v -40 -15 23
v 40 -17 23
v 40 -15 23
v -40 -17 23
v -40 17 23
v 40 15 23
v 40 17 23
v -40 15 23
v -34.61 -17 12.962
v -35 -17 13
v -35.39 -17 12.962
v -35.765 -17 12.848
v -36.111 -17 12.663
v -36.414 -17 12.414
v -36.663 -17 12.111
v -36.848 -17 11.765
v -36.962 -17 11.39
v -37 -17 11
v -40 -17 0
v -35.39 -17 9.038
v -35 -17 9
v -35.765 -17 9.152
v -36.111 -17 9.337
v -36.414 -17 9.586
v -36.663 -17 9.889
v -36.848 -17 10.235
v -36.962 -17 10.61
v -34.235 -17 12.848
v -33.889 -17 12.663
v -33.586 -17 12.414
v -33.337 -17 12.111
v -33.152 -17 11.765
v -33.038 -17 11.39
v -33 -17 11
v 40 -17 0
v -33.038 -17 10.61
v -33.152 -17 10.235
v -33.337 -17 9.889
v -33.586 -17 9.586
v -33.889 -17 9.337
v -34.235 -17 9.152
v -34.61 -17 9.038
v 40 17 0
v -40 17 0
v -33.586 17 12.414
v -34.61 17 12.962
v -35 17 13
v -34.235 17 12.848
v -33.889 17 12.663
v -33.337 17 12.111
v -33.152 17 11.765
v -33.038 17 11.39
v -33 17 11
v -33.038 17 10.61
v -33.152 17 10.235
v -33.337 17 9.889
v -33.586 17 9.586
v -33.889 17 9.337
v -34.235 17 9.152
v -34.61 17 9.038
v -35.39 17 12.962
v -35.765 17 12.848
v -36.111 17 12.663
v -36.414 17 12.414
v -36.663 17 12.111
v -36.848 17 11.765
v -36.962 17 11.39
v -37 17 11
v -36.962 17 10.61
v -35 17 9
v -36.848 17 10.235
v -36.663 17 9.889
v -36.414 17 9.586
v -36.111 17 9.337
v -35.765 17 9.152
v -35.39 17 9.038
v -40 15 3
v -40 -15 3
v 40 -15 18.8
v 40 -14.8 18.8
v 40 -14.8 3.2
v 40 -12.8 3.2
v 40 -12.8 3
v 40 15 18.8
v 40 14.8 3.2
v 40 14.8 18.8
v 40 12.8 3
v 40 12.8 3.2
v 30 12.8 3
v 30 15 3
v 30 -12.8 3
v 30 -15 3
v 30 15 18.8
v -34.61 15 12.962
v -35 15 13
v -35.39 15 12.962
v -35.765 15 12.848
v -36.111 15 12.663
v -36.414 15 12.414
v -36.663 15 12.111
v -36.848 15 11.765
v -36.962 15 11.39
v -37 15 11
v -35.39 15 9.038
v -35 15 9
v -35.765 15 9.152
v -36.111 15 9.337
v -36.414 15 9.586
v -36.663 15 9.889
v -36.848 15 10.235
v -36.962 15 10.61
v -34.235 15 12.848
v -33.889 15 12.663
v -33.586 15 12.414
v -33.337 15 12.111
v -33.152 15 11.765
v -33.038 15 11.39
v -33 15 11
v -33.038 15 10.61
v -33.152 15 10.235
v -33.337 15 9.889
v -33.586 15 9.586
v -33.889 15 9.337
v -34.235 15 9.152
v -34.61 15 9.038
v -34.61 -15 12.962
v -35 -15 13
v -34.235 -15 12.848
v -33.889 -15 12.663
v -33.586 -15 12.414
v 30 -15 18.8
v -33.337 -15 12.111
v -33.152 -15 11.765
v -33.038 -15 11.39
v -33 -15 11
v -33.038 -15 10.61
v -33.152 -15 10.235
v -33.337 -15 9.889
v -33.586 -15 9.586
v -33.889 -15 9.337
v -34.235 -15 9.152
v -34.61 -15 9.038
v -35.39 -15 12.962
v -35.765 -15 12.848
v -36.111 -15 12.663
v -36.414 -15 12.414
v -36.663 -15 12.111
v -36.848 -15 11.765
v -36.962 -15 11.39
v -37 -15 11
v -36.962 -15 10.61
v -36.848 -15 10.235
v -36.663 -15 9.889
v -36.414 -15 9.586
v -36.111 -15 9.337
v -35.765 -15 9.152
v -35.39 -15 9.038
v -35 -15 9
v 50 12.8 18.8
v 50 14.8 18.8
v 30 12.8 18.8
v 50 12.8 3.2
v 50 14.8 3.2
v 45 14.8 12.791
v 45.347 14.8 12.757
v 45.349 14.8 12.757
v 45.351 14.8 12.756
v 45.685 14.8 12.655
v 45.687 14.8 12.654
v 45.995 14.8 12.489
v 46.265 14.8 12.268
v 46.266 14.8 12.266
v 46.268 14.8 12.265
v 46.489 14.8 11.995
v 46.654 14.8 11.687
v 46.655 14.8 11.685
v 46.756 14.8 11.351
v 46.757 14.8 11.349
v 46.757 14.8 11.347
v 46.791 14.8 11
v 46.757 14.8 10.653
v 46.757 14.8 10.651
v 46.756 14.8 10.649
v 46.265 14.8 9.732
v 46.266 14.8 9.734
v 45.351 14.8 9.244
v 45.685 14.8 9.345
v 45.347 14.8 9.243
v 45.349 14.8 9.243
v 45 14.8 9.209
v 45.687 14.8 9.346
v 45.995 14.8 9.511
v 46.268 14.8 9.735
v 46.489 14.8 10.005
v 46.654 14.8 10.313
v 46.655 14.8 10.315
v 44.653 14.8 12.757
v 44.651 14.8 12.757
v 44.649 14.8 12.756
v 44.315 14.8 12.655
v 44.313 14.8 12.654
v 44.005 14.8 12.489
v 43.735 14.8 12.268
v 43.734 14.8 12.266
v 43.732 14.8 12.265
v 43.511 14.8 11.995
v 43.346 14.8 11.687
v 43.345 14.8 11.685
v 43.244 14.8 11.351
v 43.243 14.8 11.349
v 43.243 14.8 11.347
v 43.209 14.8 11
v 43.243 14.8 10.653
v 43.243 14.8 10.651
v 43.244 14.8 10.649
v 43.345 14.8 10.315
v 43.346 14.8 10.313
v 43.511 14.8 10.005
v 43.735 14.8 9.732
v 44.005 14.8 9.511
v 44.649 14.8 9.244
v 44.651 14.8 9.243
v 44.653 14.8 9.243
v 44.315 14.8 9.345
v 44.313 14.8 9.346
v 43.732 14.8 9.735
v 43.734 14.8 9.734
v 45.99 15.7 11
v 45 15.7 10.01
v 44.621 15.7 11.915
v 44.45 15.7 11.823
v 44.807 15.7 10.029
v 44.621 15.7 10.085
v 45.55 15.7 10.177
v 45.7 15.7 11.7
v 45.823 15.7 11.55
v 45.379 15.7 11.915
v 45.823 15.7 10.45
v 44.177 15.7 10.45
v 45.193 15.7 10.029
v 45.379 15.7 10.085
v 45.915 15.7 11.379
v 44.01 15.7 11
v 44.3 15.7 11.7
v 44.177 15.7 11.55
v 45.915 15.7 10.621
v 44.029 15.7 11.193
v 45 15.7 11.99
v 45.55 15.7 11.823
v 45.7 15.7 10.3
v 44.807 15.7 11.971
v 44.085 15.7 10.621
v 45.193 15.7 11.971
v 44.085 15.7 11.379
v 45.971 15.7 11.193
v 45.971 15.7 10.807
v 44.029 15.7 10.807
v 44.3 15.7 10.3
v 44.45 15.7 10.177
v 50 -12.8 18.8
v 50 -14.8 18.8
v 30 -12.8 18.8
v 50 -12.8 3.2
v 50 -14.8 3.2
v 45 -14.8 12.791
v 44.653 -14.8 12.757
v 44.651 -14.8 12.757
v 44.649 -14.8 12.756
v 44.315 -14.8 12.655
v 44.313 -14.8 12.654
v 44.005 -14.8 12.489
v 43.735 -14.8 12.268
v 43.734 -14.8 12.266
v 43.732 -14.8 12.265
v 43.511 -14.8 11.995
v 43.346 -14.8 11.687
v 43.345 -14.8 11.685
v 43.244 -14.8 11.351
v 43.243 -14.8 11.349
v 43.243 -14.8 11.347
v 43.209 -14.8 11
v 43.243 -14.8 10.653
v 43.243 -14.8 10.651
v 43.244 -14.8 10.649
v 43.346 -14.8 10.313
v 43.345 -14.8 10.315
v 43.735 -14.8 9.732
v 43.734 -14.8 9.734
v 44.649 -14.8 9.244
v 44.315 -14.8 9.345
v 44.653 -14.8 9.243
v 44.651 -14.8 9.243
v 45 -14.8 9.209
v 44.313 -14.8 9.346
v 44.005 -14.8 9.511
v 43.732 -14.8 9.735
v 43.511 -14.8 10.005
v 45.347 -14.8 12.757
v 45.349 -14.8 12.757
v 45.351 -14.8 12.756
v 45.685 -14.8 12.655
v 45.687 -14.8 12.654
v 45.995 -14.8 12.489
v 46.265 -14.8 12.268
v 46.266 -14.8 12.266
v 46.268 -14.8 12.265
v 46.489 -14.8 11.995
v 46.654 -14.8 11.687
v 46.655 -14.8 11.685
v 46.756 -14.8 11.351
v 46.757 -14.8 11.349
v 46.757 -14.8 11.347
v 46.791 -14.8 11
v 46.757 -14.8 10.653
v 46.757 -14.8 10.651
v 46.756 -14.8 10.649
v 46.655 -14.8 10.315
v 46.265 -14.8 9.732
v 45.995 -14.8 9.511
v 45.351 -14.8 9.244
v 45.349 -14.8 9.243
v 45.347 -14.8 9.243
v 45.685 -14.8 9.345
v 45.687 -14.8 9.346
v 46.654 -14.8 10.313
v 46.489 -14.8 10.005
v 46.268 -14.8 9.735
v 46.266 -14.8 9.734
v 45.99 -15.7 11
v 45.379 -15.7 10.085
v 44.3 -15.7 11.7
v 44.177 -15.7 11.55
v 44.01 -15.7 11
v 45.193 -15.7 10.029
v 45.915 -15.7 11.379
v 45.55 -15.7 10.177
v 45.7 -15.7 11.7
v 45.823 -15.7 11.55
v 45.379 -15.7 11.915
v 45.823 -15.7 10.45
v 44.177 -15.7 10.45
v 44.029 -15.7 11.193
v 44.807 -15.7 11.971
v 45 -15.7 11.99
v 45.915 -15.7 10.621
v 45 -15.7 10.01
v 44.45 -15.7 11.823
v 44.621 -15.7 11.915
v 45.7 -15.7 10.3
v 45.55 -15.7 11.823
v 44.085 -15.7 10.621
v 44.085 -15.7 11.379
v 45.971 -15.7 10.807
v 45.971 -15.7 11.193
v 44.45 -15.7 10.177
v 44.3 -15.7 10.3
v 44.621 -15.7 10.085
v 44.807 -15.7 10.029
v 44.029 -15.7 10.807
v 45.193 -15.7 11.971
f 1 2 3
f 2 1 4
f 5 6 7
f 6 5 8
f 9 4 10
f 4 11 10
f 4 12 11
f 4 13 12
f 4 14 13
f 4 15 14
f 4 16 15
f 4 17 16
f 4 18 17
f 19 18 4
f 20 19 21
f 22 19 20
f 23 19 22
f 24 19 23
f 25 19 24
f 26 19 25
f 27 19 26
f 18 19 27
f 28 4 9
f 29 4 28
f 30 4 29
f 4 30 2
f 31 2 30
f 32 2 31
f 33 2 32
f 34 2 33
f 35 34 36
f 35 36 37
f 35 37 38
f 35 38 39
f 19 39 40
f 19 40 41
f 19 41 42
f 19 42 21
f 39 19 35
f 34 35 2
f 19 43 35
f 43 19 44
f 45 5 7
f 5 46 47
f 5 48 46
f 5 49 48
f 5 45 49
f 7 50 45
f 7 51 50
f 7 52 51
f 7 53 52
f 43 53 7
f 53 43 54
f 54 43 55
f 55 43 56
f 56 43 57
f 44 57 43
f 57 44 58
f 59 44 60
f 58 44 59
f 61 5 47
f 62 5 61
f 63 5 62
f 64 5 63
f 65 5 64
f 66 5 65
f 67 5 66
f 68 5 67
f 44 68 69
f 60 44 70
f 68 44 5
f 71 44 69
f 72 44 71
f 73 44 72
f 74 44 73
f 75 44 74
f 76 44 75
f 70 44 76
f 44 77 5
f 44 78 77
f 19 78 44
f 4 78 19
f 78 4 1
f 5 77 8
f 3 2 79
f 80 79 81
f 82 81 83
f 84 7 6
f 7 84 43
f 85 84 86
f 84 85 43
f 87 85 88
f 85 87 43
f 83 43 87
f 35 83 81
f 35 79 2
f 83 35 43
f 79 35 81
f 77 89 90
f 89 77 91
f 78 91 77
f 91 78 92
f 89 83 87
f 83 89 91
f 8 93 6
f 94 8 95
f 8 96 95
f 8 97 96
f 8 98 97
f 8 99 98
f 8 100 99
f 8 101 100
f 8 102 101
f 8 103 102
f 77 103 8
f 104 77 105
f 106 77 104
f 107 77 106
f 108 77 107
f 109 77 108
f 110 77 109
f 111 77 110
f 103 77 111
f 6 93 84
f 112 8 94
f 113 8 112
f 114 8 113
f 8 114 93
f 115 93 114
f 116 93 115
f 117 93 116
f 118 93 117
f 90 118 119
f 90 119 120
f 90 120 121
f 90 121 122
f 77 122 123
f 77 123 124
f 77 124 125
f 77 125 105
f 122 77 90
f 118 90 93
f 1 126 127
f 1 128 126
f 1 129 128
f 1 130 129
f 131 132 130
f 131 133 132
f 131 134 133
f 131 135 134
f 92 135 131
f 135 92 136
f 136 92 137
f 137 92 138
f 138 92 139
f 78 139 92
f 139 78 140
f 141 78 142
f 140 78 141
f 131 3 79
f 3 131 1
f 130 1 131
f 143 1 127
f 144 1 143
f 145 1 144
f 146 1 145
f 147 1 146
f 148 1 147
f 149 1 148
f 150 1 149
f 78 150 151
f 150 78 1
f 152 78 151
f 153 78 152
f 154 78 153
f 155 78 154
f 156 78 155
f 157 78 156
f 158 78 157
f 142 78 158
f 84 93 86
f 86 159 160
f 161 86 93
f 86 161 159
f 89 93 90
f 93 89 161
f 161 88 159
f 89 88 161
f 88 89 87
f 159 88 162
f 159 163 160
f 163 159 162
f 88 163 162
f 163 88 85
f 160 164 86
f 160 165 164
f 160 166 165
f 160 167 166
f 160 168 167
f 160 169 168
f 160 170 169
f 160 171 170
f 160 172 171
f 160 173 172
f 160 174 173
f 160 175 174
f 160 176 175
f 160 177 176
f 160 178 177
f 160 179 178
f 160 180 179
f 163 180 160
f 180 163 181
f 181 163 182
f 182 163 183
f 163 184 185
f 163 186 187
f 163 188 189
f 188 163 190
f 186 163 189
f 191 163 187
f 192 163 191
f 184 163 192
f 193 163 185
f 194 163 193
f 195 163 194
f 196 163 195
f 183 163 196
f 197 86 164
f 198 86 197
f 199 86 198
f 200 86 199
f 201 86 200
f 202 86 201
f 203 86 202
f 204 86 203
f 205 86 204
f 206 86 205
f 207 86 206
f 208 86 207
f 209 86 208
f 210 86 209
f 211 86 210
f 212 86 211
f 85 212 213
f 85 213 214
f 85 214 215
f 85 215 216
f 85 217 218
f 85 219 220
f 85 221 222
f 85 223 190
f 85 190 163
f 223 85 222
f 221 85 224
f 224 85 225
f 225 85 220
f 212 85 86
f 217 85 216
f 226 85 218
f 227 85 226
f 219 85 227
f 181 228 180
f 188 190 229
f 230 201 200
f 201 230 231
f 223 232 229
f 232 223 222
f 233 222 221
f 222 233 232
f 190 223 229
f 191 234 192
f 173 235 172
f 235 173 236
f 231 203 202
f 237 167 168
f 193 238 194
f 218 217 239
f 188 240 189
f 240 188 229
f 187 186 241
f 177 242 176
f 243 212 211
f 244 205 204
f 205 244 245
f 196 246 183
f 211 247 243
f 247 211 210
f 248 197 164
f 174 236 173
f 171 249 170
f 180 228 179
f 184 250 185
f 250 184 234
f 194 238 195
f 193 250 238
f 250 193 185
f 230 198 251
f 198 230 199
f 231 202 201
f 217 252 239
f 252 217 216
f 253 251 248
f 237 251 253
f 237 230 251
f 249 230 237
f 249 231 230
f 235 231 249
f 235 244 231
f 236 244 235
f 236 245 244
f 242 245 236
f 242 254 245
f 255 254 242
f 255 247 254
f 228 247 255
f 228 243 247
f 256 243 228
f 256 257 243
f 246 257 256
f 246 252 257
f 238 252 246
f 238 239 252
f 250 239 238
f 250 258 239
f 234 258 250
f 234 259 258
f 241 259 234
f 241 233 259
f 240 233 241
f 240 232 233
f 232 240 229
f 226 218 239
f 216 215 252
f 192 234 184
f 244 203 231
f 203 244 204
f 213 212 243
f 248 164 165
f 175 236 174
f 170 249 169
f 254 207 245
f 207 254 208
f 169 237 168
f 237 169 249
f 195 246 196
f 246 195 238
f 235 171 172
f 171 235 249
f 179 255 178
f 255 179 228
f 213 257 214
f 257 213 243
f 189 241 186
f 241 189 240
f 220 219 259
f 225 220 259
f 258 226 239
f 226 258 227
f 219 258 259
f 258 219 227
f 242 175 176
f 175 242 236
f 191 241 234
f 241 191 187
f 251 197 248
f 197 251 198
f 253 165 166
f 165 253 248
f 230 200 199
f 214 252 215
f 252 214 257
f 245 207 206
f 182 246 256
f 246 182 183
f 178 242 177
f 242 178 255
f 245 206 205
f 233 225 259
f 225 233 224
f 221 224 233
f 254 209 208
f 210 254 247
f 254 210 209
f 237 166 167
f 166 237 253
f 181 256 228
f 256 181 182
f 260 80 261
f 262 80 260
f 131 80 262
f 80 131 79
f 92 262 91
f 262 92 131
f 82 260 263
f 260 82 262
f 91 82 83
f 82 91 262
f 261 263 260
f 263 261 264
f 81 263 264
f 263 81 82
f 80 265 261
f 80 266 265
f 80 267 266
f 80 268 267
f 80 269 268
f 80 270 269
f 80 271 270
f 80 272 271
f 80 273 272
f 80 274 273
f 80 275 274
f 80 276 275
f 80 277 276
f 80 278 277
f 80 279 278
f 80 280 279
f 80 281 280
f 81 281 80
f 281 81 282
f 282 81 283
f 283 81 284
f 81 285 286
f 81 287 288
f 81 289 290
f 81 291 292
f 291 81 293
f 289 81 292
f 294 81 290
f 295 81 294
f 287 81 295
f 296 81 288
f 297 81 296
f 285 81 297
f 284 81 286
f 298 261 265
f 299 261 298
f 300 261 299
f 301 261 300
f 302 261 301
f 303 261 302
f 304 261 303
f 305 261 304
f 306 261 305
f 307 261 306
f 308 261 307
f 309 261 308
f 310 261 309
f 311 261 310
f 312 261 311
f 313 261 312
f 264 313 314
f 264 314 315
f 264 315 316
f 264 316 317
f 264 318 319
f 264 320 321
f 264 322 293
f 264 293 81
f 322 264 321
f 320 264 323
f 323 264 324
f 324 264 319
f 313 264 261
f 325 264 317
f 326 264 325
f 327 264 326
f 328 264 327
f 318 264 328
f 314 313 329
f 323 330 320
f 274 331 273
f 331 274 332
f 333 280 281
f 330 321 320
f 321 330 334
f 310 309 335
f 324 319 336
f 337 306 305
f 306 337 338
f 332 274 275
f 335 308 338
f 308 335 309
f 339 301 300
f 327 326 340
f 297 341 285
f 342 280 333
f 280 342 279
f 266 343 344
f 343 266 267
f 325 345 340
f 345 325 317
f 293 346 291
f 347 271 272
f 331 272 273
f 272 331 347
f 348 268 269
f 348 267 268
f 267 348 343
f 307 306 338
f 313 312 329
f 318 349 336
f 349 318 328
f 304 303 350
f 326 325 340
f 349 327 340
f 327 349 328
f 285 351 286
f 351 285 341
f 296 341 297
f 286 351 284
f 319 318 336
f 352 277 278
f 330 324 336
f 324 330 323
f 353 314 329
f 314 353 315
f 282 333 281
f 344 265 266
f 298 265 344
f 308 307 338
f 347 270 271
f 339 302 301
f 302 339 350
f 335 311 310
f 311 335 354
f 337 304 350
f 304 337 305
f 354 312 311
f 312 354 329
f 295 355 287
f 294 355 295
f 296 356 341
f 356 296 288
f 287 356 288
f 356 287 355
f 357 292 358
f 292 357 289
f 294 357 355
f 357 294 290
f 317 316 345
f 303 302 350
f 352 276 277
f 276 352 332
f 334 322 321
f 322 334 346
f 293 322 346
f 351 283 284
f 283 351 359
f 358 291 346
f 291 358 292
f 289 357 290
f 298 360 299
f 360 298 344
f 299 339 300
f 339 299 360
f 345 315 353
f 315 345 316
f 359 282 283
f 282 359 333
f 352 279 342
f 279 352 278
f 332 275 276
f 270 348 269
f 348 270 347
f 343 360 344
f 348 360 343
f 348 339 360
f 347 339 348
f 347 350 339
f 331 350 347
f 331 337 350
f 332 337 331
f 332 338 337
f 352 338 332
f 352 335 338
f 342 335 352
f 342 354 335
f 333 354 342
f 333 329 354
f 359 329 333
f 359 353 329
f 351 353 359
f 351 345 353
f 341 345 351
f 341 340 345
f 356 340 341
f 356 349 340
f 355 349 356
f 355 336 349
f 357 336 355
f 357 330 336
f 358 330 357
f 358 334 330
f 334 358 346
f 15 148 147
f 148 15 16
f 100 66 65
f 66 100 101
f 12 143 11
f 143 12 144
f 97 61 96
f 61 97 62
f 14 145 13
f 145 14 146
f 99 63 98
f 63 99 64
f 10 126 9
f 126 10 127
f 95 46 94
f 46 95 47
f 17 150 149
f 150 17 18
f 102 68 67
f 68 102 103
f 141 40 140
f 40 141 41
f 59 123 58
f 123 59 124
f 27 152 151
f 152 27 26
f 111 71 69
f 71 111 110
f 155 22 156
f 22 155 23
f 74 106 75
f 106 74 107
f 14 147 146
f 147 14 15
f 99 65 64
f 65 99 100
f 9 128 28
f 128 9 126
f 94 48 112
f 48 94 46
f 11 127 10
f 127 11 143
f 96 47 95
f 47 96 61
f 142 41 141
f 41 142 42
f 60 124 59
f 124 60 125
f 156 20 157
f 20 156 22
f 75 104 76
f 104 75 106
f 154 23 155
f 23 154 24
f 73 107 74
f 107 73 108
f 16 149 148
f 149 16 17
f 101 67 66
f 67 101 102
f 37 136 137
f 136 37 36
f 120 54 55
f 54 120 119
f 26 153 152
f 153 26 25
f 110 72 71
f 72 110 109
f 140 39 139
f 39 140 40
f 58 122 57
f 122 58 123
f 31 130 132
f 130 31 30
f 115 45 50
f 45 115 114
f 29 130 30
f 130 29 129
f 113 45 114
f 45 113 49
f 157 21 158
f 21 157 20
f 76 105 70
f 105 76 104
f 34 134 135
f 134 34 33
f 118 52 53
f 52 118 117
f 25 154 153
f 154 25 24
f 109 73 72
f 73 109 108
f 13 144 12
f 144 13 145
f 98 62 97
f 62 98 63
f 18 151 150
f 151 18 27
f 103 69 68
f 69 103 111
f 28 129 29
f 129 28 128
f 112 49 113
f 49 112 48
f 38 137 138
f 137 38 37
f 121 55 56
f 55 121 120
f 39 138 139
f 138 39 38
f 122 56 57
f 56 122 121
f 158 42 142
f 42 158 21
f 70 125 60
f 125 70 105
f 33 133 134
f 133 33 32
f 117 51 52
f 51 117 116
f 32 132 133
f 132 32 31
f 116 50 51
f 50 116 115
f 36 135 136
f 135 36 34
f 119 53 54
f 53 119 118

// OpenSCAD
// Modulární kabelový žlab: rovný díl, zatáčka L, křižovatka +, kryty.
//
// Spoj na zacvaknutí: konec s čepy (M) má na bocích pružné jazýčky
// s kuželovým čepem, které se zasunou dovnitř sousedního dílu; konec
// s otvory (F) má v bočních stěnách kulaté díry, do kterých čep zapadne.
// Kryt drží límcem v kanálu a zacvakne se čepy na límci do otvorů
// pod horní hranou stěn.
//
// Žebrování = průhledové výřezy skrz stěny, dno nebo kryt; mezi výřezy
// zůstávají žebra. Výřezy můžou být šikmé (úhel od svislice / od příčného směru).
//
// Zkosení: horní vnější hrany stěn (ch) a svislé vnější hrany na koncích
// dílů u spojů (cj); obojí platí i pro kryt.
//
// Souřadnice: dno leží v rovině z = 0. Díl se skládá z ramen vycházejících
// ze středu; port = střed čela ramene v rovině dna, úhel = směr ven.
// Pořadí a polohy portů musí odpovídat funkci `ports` v app.js.

/* [Co renderovat] */
what = "body";     // [body, lid]
part = "straight"; // [straight, corner, cross]
len  = 80;         // délka rovného dílu
arm  = 40;         // délka ramene zatáčky/křižovatky od středu k portu
genders = "FM";    // pohlaví portů v pořadí ramen: F = otvory, M = čepy

/* [Profil] */
w = 30;        // vnitřní šířka
h = 20;        // vnitřní výška
t = 2;         // tloušťka stěny
f = 3;         // tloušťka dna
c = 0.2;       // vůle spojů
bump = 0.9;    // výška čepu spoje dílů
lid_bump = 0.6; // výška čepu krytu

/* [Zkosení] */
ch = 0; // horní vnější hrany stěn, 0 = bez zkosení
cj = 0; // svislé hrany na koncích u spojů, 0 = bez zkosení

/* [Výřezy v bocích] */
slots    = false;
slot_w   = 6;  // šířka výřezu
slot_bar = 4;  // šířka žebra mezi výřezy
slot_m   = 2;  // okraj nad dnem a pod límcem krytu
slot_a   = 45; // úhel výřezu, 0 = svislý

/* [Výřezy ve dně] */
floor_slots    = false;
floor_slot_w   = 4;
floor_slot_bar = 6;
floor_slot_m   = 4; // okraj od stěn
floor_slot_a   = 45;

/* [Kryt] */
lid       = false; // díl má otvory pro zacvaknutí krytu
lid_t     = 2;
lid_slots    = false;
lid_slot_w   = 6;
lid_slot_bar = 6;
lid_slot_m   = 2; // okraj od límce
lid_slot_a   = 45;

/* [Pevné rozměry spojů] */
tab_len   = 10;   // jak daleko jazýček přesahuje přes konec dílu
bump_r    = 1.8;  // poloměr paty čepu spoje dílů
lip_d     = 4;    // hloubka límce krytu
lip_w     = 1.6;  // tloušťka límce krytu
lid_bump_r = 1.2; // poloměr paty čepu krytu
lid_bump_z = 2.4; // hloubka čepu krytu pod horní hranou stěny

$fn = 32;

if (what == "body")
  cable_part(part, len, arm, w, h, t, f, c, bump, genders, ch, cj,
             slots, slot_w, slot_bar, slot_m, slot_a,
             floor_slots, floor_slot_w, floor_slot_bar, floor_slot_m, floor_slot_a, lid);
else if (what == "lid")
  // Tisková orientace: deska krytu na podložce, límec nahoru.
  rotate([180, 0, 0]) translate([0, 0, -lid_t])
    cable_lid(part, len, arm, w, t, c, lid_bump, lid_t, ch, cj,
              lid_slots, lid_slot_w, lid_slot_bar, lid_slot_m, lid_slot_a);

// Ramena dílu: [úhel, délka od středu k portu].
function arms(part, len, arm) =
  part == "straight" ? [[180, len / 2], [0, len / 2]] :
  part == "corner"   ? [[180, arm], [90, arm]] :
                       [[0, arm], [90, arm], [180, arm], [270, arm]];

// Úseky ramen bez spojů na koncích: [úhel, x0, x1]. Na koncích jsou jazýčky
// nebo otvory pro čepy, takže se tam nic nevyřezává.
function free_segments(part, len, arm, W) =
  let (keep = tab_len + 1)
  part == "straight" ? [[0, -len / 2 + keep, len / 2 - keep]]
                     : [for (a = arms(part, len, arm)) [a[0], W / 2, a[1] - keep]];

// Polohy čepů krytu: [úhel, x] – na každém volném úseku kraje, nebo střed.
function lid_snaps(part, len, arm, W) =
  [for (sg = free_segments(part, len, arm, W))
     each (sg[2] - sg[1] > 30 ? [[sg[0], sg[1] + 4], [sg[0], sg[2] - 4]]
                              : [[sg[0], (sg[1] + sg[2]) / 2]])];

// Výška jazýčku: nad dnem souseda a pod límcem krytu.
function tab_z0(f, c) = f + c;
function tab_z1(f, h, c) = f + h - lip_d - c;

// Pás podél X od x0 do x1, šířka W vycentrovaná na ose, výška H.
module bar(x0, x1, W, H) translate([x0, -W / 2, 0]) cube([x1 - x0, W, H]);
module bar2d(x0, x1, W) translate([x0, -W / 2]) square([x1 - x0, W]);

// Zkosení nesmí prořezat stěnu ani kryt.
function chamfer(v, thickness) = max(0, min(v, thickness - 0.6));

// Zkosení x podle z (kolem výšky zc), resp. x podle y.
module shear_xz(k, zc) multmatrix([[1, 0, k, -k * zc], [0, 1, 0, 0], [0, 0, 1, 0], [0, 0, 0, 1]]) children();
module shear_yz(k, zc) multmatrix([[1, 0, 0, 0], [0, 1, k, -k * zc], [0, 0, 1, 0], [0, 0, 0, 1]]) children();
module shear_xy(k) multmatrix([[1, k, 0, 0], [0, 1, 0, 0], [0, 0, 1, 0], [0, 0, 0, 1]]) children();

// Rameno se zkosenými podélnými horními hranami a zkoseným vnitřním koncem.
// Konec u portu zůstává rovný, navazuje na souseda. Vnitřní konec je
// u rovného dílu i křižovatky schovaný v protějším rameni, u zatáčky tvoří vnější roh.
module arm_block(L, W, H, e) {
  if (e <= 0) bar(-W / 2, L, W, H);
  else hull() {
    bar(-W / 2, L, W, H - e);
    translate([0, 0, H - 0.01]) bar(-W / 2 + e, L, W - 2 * e, 0.01);
  }
}

// Zkosení svislých vnějších hran na konci ramene (konec je v x = L).
module joint_chamfer(L, W, H, e) {
  if (e > 0)
    for (m = [0, 1]) mirror([0, m, 0])
      translate([0, 0, -1]) linear_extrude(H + 2)
        polygon([[L + 0.01, W / 2 + 0.01], [L - e, W / 2 + 0.01], [L + 0.01, W / 2 - e]]);
}

// Středy rovnoměrně rozložených výřezů šířky sw s žebry šířky sb v intervalu [x0, x1].
function spread(x0, x1, sw, sb) =
  x1 - x0 < sw ? [] :
  let (n = floor((x1 - x0 - sw) / (sw + sb)) + 1)
    [for (k = [0 : n - 1]) (x0 + x1) / 2 + (k - (n - 1) / 2) * (sw + sb)];

// Výřezy v bočních stěnách. Šikmé výřezy mají na protilehlé stěně opačný
// sklon, takže z vnějšku vypadají obě stěny stejně a díl zůstává souměrný
// při otočení (kvůli slučování stejných dílů do jednoho STL).
module side_slots(part, len, arm, w, h, t, f, sw, sb, m, ang) {
  W = w + 2 * t;
  z0 = f + m;
  z1 = f + h - lip_d - m;
  zc = (z0 + z1) / 2;
  k = tan(ang);
  off = abs(k) * (z1 - z0);
  if (z1 > z0) {
    for (sg = free_segments(part, len, arm, W)) rotate(sg[0])
      for (side = [1, -1])
        for (x = spread(sg[1] + m + off / 2, sg[2] - m - off / 2, sw, sb))
          shear_xz(side * k, zc)
            translate([x - sw / 2, side > 0 ? w / 2 - 1 : -W / 2 - 1, z0]) cube([sw, t + 2, z1 - z0]);
    // Plochy středu, ze kterých nevede rameno (vnější roh zatáčky).
    if (part != "straight")
      for (a = [0, 90, 180, 270])
        if (len([for (r = arms(part, len, arm)) if (r[0] == a) 1]) == 0)
          rotate(a) for (y = spread(-w / 2 + m + off / 2, w / 2 - m - off / 2, sw, sb))
            shear_yz(-k, zc) translate([w / 2 - 1, y - sw / 2, z0]) cube([t + 2, sw, z1 - z0]);
  }
}

// Výřezy skrz dno.
module floor_slots_cut(part, len, arm, w, t, f, sw, sb, m, ang) {
  W = w + 2 * t;
  k = tan(ang);
  off = abs(k) * (w - 2 * m);
  for (sg = free_segments(part, len, arm, W)) rotate(sg[0])
    for (x = spread(sg[1] + m + off / 2, sg[2] - m - off / 2, sw, sb))
      shear_xy(k) translate([x - sw / 2, -(w / 2 - m), -1]) cube([sw, w - 2 * m, f + 2]);
}

// Jazýčky s čepy na konci ramene (konec ramene je v x = L).
module male_tabs(L, w, h, t, f, c, bump) {
  z0 = tab_z0(f, c);
  z1 = tab_z1(f, h, c);
  for (m = [0, 1]) mirror([0, m, 0]) {
    // Zesílení stěny uvnitř dílu, ze kterého jazýček vychází.
    translate([L - tab_len, w / 2 - c - t, f - 0.01]) cube([tab_len, t + c + 0.02, z1 - f + 0.01]);
    translate([L - 0.01, w / 2 - c - t, z0]) cube([tab_len + 0.01, t, z1 - z0]);
    translate([L + tab_len / 2, w / 2 - c - 0.01, (z0 + z1) / 2])
      rotate([-90, 0, 0]) cylinder(h = bump + 0.01, r1 = bump_r, r2 = bump_r * 0.55);
  }
}

module cable_part(part, len = 80, arm = 40, w = 30, h = 20, t = 2, f = 3, c = 0.2, bump = 0.9,
                  genders = "FM", ch = 0, cj = 0,
                  slots = false, slot_w = 6, slot_bar = 4, slot_m = 2, slot_a = 45,
                  floor_slots = false, floor_slot_w = 4, floor_slot_bar = 6, floor_slot_m = 4, floor_slot_a = 45,
                  lid = false) {
  A = arms(part, len, arm);
  W = w + 2 * t;
  H = f + h;
  e = chamfer(ch, t);
  zc = (tab_z0(f, c) + tab_z1(f, h, c)) / 2;
  difference() {
    union() {
      difference() {
        for (a = A) rotate(a[0]) arm_block(a[1], W, H, e);
        translate([0, 0, f]) for (a = A) rotate(a[0]) bar(-w / 2, a[1] + 1, w, h + 1);
      }
      for (i = [0 : len(A) - 1])
        if (genders[i] == "M") rotate(A[i][0]) male_tabs(A[i][1], w, h, t, f, c, bump);
    }
    // Otvory pro čepy souseda.
    for (i = [0 : len(A) - 1])
      if (genders[i] == "F")
        rotate(A[i][0]) translate([A[i][1] - tab_len / 2, 0, zc])
          rotate([90, 0, 0]) cylinder(r = bump_r + c, h = W + 2, center = true);
    // Otvory pro čepy krytu.
    if (lid)
      for (s = lid_snaps(part, len, arm, W))
        rotate(s[0]) translate([s[1], 0, H - lid_bump_z])
          rotate([90, 0, 0]) cylinder(r = lid_bump_r + c, h = W + 2, center = true);
    for (a = A) rotate(a[0]) joint_chamfer(a[1], W, H, chamfer(cj, t));
    if (slots) side_slots(part, len, arm, w, h, t, f, slot_w, slot_bar, slot_m, slot_a);
    if (floor_slots) floor_slots_cut(part, len, arm, w, t, f, floor_slot_w, floor_slot_bar, floor_slot_m, floor_slot_a);
  }
}

module footprint(A, W) for (a = A) rotate(a[0]) bar2d(-W / 2, a[1], W);
module channel2d(A, w, ext) for (a = A) rotate(a[0]) bar2d(-w / 2, a[1] + ext, w);

// Kryt v poloze na dílu: deska z = 0..lid_t, límec pod ní (z < 0).
module cable_lid(part, len = 80, arm = 40, w = 30, t = 2, c = 0.2, lid_bump = 0.6, lid_t = 2, ch = 0, cj = 0,
                 lid_slots = false, lid_slot_w = 6, lid_slot_bar = 6, lid_slot_m = 2, lid_slot_a = 45) {
  A = arms(part, len, arm);
  W = w + 2 * t;
  inner = w / 2 - c - lip_w; // vnitřní líc límce
  half = inner - lid_slot_m;
  k = tan(lid_slot_a);
  off = abs(k) * 2 * half;
  difference() {
    for (a = A) rotate(a[0]) arm_block(a[1], W, lid_t, chamfer(ch, lid_t));
    for (a = A) rotate(a[0]) joint_chamfer(a[1], W, lid_t, chamfer(cj, t));
    if (lid_slots && half > 0)
      for (sg = free_segments(part, len, arm, W)) rotate(sg[0])
        for (x = spread(sg[1] + lid_slot_m + off / 2, sg[2] - lid_slot_m - off / 2, lid_slot_w, lid_slot_bar))
          shear_xy(k) translate([x - lid_slot_w / 2, -half, -1]) cube([lid_slot_w, 2 * half, lid_t + 2]);
  }
  translate([0, 0, -lip_d]) linear_extrude(lip_d + 0.01) intersection() {
    footprint(A, W);
    difference() {
      offset(delta = -c) channel2d(A, w, 5);
      offset(delta = -c - lip_w) channel2d(A, w, 5);
    }
  }
  // Čepy na vnější straně límce.
  for (s = lid_snaps(part, len, arm, W)) rotate(s[0])
    for (m = [0, 1]) mirror([0, m, 0])
      translate([s[1], w / 2 - c - 0.01, -lid_bump_z])
        rotate([-90, 0, 0]) cylinder(h = lid_bump + 0.01, r1 = lid_bump_r, r2 = lid_bump_r * 0.55);
}
